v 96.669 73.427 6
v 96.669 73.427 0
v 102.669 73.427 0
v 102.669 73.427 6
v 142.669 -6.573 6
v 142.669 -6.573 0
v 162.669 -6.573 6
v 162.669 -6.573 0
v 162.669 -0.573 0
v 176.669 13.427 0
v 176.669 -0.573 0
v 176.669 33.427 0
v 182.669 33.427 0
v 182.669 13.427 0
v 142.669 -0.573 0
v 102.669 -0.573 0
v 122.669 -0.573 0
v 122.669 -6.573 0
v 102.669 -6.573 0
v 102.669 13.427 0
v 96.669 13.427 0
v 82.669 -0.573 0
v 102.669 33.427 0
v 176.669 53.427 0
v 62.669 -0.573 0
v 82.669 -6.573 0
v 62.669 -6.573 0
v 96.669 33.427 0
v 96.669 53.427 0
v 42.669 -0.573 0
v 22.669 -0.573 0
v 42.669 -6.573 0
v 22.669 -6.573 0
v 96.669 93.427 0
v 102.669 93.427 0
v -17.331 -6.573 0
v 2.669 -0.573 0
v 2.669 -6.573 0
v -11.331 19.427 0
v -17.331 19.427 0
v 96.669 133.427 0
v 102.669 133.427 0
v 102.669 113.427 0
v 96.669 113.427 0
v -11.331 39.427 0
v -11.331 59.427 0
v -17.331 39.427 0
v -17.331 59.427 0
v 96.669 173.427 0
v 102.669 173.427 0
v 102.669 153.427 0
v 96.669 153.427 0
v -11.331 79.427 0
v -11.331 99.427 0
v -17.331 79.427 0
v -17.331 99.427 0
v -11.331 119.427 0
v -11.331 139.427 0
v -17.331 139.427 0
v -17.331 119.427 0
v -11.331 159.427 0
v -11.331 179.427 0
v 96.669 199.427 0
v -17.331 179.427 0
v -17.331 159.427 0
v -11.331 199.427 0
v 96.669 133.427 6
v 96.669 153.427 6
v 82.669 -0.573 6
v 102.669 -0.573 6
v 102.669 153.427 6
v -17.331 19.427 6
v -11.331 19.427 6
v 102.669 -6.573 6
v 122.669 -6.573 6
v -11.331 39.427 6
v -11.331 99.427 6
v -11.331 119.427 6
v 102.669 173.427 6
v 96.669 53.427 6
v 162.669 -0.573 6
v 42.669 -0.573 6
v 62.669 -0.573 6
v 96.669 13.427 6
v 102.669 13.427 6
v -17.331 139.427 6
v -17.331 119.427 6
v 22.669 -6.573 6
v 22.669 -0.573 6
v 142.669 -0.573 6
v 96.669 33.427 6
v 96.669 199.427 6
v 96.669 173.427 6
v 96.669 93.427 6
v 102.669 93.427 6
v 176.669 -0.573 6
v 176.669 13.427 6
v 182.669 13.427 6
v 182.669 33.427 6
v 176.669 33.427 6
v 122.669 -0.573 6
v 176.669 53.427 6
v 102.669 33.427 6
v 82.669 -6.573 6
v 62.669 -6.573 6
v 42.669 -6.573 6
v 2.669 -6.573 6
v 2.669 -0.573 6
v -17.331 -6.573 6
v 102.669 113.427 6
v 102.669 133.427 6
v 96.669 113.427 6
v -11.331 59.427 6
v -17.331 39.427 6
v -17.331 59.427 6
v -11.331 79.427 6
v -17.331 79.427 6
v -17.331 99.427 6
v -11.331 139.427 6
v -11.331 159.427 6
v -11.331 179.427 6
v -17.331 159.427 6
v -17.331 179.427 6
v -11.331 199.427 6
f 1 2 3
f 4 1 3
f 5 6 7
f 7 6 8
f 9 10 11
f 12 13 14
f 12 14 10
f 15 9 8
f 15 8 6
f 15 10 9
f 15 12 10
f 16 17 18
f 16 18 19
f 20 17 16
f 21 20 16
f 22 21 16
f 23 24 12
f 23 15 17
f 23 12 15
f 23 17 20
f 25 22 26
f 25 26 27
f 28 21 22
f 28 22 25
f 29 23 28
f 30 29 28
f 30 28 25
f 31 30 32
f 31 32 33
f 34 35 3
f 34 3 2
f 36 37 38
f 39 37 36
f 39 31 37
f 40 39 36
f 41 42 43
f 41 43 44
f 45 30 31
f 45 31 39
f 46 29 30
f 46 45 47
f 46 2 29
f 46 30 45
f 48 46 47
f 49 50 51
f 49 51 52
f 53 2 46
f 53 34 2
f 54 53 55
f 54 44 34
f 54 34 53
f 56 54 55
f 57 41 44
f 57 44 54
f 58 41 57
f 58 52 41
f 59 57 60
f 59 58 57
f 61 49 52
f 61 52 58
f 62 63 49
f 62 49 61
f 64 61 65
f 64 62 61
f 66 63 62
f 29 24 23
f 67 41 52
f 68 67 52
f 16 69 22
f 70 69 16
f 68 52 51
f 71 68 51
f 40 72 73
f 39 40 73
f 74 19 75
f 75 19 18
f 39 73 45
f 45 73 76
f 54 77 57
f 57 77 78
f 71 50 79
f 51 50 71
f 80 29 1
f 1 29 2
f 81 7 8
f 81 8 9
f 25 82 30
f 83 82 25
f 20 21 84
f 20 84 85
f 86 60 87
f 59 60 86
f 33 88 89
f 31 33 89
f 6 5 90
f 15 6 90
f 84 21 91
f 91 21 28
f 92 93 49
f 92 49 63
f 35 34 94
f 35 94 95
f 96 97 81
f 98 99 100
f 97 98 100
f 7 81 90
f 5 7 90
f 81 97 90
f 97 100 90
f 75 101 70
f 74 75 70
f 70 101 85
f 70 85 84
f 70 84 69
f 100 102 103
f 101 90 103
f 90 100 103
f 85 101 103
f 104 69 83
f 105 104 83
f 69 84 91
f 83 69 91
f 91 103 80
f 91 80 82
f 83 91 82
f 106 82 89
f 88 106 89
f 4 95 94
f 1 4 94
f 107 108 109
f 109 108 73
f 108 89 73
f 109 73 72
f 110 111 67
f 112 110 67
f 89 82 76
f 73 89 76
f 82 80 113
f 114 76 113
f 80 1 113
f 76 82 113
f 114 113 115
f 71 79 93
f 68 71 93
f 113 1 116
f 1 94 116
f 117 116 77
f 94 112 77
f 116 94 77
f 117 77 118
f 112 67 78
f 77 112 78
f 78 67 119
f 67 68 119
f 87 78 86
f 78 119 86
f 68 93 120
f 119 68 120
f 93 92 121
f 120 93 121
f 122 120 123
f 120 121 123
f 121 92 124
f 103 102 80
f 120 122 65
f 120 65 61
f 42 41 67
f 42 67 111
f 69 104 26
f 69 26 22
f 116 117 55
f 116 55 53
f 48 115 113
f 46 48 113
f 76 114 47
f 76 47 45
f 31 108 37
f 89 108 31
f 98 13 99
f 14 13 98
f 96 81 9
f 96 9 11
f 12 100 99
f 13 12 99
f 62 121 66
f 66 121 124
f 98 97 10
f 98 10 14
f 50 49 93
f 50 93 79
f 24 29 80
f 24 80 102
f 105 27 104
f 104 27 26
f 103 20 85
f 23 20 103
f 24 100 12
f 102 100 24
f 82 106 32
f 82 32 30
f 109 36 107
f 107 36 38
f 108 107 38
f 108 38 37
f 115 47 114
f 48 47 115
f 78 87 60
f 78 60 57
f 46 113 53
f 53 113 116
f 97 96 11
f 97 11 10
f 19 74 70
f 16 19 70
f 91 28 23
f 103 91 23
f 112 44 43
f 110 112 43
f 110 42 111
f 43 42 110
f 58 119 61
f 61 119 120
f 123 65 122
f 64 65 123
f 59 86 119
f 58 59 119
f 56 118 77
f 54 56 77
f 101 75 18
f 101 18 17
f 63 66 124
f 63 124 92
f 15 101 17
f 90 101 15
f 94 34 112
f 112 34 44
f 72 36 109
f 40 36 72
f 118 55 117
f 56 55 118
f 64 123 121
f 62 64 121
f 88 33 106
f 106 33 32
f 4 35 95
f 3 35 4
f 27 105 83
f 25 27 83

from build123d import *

# Parameters (mm, degrees)
BOSS_EXTRUDE1_DEPTH = 6
SKETCH2_W           = 20
SKETCH2_H           = 6
CUT_EXTRUDE1_DEPTH  = 7
LPATTERN1_COUNT     = 5
LPATTERN1_PITCH     = 40
SKETCH3_W           = 6
SKETCH3_H           = 20
CUT_EXTRUDE2_DEPTH  = 7
LPATTERN2_COUNT     = 5
LPATTERN2_PITCH     = 40
SKETCH4_W           = 6
SKETCH4_H           = 6
CUT_EXTRUDE3_DEPTH  = 10
SKETCH5_W           = 6
SKETCH5_H           = 20
CUT_EXTRUDE4_DEPTH  = 10
LPATTERN3_COUNT     = 2
LPATTERN3_PITCH     = 40
SKETCH7_W           = 6
SKETCH7_H           = 20
CUT_EXTRUDE5_DEPTH  = 10
LPATTERN4_COUNT     = 5
LPATTERN4_PITCH     = 40


with BuildPart() as part:
    # Sketch1 → Boss-Extrude1 (new body)
    with BuildSketch(Plane.XY):
        Polygon((-17.330934256, 199.427419355), (102.669065744, 199.427419355), (102.669065744, 53.427419355), (182.669065744, 53.427419355), (182.669065744, -6.572580645), (102.669065744, -6.572580645), (-17.330934256, -6.572580645), align=None)
    extrude(amount=BOSS_EXTRUDE1_DEPTH)

    # Sketch2 → Cut-Extrude1 (cut, through all)
    with BuildSketch(Plane.XY.offset(6)):
        with Locations((12.669065744, -3.572580645)):
            Rectangle(SKETCH2_W, SKETCH2_H)
    cut_extrude1 = extrude(amount=-CUT_EXTRUDE1_DEPTH, mode=Mode.SUBTRACT)

    # LPattern1: Cut-Extrude1 ×5
    with Locations(*[(i * LPATTERN1_PITCH, 0, 0) for i in range(1, LPATTERN1_COUNT)]):
        add(cut_extrude1, mode=Mode.SUBTRACT)

    # Sketch3 → Cut-Extrude2 (cut, through all)
    with BuildSketch(Plane.XY):
        with Locations((99.669065744, 23.427419355)):
            Rectangle(SKETCH3_W, SKETCH3_H)
    cut_extrude2 = extrude(amount=CUT_EXTRUDE2_DEPTH, mode=Mode.SUBTRACT)

    # LPattern2: Cut-Extrude2 ×5
    with Locations(*[(0, i * LPATTERN2_PITCH, 0) for i in range(1, LPATTERN2_COUNT)]):
        add(cut_extrude2, mode=Mode.SUBTRACT)

    # Sketch4 → Cut-Extrude3 (cut)
    with BuildSketch(Plane.XY.offset(6)):
        with Locations((99.669065744, 196.427419355)):
            Rectangle(SKETCH4_W, SKETCH4_H)
    extrude(amount=-CUT_EXTRUDE3_DEPTH, mode=Mode.SUBTRACT)

    # Sketch5 → Cut-Extrude4 (cut)
    with BuildSketch(Plane.XY.offset(6)):
        with Locations((179.669065744, 43.427419355)):
            Rectangle(SKETCH5_W, SKETCH5_H)
    cut_extrude4 = extrude(amount=-CUT_EXTRUDE4_DEPTH, mode=Mode.SUBTRACT)

    # LPattern3: Cut-Extrude4 ×2
    with Locations(*[(0, -i * LPATTERN3_PITCH, 0) for i in range(1, LPATTERN3_COUNT)]):
        add(cut_extrude4, mode=Mode.SUBTRACT)

    # Sketch7 → Cut-Extrude5 (cut)
    with BuildSketch(Plane.XY.offset(6)):
        with Locations((-14.330934256, 189.427419355)):
            Rectangle(SKETCH7_W, SKETCH7_H)
    cut_extrude5 = extrude(amount=-CUT_EXTRUDE5_DEPTH, mode=Mode.SUBTRACT)

    # LPattern4: Cut-Extrude5 ×5
    with Locations(*[(0, -i * LPATTERN4_PITCH, 0) for i in range(1, LPATTERN4_COUNT)]):
        add(cut_extrude5, mode=Mode.SUBTRACT)


solid = part.part
